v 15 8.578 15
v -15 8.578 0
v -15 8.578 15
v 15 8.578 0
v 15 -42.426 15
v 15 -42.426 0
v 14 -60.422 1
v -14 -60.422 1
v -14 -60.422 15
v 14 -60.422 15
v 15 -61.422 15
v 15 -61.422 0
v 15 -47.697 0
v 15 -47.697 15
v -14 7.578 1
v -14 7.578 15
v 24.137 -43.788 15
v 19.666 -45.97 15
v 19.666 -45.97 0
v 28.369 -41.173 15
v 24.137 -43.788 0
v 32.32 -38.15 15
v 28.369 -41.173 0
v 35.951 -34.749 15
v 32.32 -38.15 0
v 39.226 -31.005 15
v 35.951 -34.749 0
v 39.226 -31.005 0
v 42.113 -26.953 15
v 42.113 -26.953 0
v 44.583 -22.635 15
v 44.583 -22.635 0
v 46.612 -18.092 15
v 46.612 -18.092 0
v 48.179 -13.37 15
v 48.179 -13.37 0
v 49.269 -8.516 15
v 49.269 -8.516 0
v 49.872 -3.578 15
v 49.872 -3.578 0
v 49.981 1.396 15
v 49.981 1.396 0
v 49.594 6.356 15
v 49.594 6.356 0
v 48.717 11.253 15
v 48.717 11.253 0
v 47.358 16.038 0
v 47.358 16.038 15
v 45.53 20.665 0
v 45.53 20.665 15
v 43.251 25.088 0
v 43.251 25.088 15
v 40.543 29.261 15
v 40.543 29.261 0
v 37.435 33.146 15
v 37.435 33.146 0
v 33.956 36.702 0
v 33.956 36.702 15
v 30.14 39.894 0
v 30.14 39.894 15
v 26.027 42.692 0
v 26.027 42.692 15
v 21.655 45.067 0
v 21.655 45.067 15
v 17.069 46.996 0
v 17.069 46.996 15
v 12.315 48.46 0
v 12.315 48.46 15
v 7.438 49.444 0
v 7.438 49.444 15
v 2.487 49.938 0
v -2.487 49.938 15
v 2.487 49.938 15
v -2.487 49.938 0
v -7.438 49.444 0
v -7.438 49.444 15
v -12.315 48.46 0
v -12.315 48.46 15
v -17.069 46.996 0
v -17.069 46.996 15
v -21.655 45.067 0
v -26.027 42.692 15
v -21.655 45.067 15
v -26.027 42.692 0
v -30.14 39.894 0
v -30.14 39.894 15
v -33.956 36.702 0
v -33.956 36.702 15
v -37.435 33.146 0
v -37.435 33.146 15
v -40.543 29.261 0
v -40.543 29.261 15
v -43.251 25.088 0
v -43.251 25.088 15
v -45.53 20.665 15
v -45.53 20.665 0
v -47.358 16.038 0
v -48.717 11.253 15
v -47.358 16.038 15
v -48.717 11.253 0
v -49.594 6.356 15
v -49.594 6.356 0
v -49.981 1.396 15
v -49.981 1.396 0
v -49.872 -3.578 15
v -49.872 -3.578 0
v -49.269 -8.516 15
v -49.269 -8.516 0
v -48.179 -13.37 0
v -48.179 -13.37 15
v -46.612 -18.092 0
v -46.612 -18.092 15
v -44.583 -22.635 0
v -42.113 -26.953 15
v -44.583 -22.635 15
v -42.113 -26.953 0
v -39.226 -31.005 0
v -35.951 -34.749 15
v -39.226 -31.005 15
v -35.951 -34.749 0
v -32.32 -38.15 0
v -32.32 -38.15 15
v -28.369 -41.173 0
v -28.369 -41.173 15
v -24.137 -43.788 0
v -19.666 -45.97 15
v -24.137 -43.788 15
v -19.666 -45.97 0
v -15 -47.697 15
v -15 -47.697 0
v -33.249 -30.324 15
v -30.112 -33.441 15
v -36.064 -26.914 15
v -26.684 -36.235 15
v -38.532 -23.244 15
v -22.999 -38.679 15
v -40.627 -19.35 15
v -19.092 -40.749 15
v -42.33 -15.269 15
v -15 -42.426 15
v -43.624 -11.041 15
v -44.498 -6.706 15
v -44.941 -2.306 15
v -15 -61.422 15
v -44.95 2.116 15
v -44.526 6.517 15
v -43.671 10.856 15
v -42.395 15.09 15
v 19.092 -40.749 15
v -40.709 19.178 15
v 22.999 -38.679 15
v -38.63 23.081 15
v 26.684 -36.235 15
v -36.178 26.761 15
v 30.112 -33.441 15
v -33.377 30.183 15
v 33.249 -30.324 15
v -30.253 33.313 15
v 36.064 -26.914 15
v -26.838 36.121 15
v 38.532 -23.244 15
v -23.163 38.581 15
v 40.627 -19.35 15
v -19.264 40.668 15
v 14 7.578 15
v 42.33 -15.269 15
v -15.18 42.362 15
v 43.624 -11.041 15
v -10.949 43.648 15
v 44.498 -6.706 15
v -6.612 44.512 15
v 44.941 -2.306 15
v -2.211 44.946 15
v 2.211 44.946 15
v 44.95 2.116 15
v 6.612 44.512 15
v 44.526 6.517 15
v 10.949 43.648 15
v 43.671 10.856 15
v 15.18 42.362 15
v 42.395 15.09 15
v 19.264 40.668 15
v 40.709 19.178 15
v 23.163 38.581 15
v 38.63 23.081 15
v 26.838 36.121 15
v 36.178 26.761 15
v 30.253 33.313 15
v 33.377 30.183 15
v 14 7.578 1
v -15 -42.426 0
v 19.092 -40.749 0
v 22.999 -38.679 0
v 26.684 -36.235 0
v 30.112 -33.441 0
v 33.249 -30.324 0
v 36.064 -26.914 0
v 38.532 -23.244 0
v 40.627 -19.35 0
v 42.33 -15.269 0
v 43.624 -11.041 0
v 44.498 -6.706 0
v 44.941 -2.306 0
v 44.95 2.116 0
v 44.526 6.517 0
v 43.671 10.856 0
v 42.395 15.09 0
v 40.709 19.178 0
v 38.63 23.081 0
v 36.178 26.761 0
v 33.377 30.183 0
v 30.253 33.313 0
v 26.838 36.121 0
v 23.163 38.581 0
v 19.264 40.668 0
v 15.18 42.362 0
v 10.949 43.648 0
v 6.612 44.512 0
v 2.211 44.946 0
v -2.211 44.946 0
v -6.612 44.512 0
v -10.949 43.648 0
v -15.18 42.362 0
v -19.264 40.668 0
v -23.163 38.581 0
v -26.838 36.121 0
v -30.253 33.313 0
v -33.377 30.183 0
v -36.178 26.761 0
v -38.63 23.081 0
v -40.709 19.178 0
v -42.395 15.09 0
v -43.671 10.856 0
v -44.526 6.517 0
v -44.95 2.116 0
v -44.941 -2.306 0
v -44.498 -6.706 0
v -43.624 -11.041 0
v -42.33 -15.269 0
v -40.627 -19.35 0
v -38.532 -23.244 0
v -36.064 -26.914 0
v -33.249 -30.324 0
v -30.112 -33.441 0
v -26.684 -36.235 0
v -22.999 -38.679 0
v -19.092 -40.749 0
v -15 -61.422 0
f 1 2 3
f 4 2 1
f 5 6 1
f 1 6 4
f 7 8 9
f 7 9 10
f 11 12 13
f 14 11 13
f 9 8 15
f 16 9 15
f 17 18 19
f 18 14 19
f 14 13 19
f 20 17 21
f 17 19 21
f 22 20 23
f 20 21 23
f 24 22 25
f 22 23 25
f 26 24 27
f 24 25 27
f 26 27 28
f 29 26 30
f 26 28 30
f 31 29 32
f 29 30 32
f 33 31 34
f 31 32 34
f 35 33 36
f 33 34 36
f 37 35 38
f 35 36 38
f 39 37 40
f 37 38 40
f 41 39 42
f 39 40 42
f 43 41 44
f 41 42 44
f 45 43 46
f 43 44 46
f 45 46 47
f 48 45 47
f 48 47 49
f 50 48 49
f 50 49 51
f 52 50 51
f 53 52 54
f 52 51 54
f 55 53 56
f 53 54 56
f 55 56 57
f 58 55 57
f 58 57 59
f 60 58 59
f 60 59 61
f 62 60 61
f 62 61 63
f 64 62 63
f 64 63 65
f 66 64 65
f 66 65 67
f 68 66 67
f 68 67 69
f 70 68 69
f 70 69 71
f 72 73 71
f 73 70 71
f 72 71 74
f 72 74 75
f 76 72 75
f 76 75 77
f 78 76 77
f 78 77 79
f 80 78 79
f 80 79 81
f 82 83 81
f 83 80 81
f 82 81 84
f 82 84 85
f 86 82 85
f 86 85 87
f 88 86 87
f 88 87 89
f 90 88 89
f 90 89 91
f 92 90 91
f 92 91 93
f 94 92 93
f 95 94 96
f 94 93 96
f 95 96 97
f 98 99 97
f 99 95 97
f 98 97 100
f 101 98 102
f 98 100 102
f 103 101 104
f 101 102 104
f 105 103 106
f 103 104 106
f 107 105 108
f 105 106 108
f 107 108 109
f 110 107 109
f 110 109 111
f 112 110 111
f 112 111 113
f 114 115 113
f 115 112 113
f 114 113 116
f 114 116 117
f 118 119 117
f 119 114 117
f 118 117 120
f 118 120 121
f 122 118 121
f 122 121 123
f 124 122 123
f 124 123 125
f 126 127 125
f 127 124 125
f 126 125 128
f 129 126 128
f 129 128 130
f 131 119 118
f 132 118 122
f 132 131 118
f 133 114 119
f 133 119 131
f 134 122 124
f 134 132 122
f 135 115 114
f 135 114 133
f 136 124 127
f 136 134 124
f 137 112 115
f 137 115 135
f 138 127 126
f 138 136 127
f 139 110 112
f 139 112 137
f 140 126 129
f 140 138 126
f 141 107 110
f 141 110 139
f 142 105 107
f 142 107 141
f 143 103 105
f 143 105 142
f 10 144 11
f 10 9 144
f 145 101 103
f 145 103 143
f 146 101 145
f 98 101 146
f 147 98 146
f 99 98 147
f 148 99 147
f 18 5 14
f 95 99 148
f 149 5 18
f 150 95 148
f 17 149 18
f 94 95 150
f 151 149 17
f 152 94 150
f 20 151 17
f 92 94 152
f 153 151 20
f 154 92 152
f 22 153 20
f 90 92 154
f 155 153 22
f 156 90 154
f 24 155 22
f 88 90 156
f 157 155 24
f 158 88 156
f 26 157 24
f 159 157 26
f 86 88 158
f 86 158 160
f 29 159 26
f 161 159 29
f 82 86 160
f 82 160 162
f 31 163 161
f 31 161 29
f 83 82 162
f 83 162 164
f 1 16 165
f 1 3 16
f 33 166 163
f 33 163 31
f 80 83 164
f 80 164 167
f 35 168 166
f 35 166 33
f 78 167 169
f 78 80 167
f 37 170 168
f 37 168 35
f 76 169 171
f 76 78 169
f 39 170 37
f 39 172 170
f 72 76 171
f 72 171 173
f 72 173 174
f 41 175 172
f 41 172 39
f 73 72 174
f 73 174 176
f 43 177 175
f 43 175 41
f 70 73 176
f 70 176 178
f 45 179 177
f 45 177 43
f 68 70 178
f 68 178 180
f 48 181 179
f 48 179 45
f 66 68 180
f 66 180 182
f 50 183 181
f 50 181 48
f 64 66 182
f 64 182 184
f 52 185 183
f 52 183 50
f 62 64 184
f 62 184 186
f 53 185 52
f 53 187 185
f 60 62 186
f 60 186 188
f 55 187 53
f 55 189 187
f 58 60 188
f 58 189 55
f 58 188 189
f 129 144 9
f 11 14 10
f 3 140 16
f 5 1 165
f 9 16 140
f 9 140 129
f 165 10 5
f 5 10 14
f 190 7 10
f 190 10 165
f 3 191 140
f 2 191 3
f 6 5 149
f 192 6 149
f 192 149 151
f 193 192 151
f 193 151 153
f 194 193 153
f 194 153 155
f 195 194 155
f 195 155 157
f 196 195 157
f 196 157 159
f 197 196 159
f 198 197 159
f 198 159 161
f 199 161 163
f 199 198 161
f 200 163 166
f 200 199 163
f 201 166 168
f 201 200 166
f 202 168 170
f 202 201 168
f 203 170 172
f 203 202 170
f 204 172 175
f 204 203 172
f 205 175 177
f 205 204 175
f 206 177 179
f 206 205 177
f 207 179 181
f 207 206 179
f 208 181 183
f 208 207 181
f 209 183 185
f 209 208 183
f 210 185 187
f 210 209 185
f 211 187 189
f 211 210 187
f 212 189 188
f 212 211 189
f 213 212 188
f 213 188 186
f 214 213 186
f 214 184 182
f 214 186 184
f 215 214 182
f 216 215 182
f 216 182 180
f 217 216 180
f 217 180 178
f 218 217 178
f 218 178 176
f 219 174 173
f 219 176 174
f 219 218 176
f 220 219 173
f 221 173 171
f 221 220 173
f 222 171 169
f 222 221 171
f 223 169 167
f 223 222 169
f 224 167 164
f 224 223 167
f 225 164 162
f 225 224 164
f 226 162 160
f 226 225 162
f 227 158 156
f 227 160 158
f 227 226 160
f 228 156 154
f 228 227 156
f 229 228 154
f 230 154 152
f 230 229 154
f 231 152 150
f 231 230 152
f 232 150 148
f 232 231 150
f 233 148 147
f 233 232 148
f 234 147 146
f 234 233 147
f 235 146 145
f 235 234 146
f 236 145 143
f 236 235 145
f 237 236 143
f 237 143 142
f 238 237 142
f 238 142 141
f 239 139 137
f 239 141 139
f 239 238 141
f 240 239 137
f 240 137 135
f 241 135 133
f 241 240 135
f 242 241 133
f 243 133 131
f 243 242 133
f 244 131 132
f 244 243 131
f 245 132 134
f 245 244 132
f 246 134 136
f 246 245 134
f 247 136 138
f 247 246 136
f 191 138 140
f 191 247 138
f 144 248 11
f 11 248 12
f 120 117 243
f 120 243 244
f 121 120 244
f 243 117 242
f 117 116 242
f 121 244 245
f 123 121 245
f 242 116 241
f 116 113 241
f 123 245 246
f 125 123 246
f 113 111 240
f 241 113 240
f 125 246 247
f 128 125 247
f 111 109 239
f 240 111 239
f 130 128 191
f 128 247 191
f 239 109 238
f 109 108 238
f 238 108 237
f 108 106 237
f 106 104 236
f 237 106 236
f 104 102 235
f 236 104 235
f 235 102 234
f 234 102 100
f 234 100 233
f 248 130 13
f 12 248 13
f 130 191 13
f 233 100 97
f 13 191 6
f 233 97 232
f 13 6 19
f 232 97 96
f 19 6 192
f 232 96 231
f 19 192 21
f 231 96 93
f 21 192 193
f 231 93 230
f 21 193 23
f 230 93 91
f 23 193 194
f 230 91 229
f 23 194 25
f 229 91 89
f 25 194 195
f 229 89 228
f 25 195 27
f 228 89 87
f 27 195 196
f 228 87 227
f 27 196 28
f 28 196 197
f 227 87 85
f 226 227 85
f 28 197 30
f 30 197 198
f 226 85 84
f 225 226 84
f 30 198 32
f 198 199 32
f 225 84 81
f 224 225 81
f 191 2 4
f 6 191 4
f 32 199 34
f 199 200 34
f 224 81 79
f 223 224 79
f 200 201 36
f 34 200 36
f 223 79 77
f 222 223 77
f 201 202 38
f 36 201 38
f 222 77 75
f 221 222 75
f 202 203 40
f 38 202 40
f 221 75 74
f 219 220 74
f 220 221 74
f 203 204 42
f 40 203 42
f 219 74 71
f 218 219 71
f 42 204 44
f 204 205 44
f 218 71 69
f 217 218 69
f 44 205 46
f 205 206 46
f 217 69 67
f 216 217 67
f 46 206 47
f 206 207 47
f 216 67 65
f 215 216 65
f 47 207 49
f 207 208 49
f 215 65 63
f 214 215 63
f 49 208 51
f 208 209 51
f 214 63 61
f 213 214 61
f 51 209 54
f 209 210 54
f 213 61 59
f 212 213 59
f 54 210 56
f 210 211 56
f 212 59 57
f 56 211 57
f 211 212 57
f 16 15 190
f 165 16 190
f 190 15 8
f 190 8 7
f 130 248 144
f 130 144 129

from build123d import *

# Parameters (mm, degrees)
F0_R     = 50
F0_R_2   = 45
F1_DEPTH = 15
F2_W     = 30
F2_H     = 15
F3_DEPTH = 50
F5_W     = 30
F5_H     = 70
F5_W_2   = 28
F5_H_2   = 68
F6_DEPTH = 15
F7_W     = 28
F7_H     = 68
F8_DEPTH = 1


with BuildPart() as f1:
    # F0 (on Top) → F1 (new body)
    with BuildSketch(Plane.XY):
        Circle(F0_R)
        Circle(F0_R_2, mode=Mode.SUBTRACT)
    extrude(amount=F1_DEPTH)

    # F2 (on Front) → F3 (cut)
    with BuildSketch(Plane.XZ):
        with Locations((0, 7.5)):
            Rectangle(F2_W, F2_H)
    extrude(amount=F3_DEPTH, mode=Mode.SUBTRACT)

    # F5 (on face) → F6 (join)
    with BuildSketch(Plane.XY):
        with Locations((0, -26.421925)):
            Rectangle(F5_W, F5_H)
        with Locations((0, -26.421925)):
            Rectangle(F5_W_2, F5_H_2, mode=Mode.SUBTRACT)
    extrude(amount=F6_DEPTH)

    # F7 (on Top) → F8 (join)
    with BuildSketch(Plane.XY):
        with Locations((0, -26.421925)):
            Rectangle(F7_W, F7_H)
    extrude(amount=F8_DEPTH)


solid = f1.part
